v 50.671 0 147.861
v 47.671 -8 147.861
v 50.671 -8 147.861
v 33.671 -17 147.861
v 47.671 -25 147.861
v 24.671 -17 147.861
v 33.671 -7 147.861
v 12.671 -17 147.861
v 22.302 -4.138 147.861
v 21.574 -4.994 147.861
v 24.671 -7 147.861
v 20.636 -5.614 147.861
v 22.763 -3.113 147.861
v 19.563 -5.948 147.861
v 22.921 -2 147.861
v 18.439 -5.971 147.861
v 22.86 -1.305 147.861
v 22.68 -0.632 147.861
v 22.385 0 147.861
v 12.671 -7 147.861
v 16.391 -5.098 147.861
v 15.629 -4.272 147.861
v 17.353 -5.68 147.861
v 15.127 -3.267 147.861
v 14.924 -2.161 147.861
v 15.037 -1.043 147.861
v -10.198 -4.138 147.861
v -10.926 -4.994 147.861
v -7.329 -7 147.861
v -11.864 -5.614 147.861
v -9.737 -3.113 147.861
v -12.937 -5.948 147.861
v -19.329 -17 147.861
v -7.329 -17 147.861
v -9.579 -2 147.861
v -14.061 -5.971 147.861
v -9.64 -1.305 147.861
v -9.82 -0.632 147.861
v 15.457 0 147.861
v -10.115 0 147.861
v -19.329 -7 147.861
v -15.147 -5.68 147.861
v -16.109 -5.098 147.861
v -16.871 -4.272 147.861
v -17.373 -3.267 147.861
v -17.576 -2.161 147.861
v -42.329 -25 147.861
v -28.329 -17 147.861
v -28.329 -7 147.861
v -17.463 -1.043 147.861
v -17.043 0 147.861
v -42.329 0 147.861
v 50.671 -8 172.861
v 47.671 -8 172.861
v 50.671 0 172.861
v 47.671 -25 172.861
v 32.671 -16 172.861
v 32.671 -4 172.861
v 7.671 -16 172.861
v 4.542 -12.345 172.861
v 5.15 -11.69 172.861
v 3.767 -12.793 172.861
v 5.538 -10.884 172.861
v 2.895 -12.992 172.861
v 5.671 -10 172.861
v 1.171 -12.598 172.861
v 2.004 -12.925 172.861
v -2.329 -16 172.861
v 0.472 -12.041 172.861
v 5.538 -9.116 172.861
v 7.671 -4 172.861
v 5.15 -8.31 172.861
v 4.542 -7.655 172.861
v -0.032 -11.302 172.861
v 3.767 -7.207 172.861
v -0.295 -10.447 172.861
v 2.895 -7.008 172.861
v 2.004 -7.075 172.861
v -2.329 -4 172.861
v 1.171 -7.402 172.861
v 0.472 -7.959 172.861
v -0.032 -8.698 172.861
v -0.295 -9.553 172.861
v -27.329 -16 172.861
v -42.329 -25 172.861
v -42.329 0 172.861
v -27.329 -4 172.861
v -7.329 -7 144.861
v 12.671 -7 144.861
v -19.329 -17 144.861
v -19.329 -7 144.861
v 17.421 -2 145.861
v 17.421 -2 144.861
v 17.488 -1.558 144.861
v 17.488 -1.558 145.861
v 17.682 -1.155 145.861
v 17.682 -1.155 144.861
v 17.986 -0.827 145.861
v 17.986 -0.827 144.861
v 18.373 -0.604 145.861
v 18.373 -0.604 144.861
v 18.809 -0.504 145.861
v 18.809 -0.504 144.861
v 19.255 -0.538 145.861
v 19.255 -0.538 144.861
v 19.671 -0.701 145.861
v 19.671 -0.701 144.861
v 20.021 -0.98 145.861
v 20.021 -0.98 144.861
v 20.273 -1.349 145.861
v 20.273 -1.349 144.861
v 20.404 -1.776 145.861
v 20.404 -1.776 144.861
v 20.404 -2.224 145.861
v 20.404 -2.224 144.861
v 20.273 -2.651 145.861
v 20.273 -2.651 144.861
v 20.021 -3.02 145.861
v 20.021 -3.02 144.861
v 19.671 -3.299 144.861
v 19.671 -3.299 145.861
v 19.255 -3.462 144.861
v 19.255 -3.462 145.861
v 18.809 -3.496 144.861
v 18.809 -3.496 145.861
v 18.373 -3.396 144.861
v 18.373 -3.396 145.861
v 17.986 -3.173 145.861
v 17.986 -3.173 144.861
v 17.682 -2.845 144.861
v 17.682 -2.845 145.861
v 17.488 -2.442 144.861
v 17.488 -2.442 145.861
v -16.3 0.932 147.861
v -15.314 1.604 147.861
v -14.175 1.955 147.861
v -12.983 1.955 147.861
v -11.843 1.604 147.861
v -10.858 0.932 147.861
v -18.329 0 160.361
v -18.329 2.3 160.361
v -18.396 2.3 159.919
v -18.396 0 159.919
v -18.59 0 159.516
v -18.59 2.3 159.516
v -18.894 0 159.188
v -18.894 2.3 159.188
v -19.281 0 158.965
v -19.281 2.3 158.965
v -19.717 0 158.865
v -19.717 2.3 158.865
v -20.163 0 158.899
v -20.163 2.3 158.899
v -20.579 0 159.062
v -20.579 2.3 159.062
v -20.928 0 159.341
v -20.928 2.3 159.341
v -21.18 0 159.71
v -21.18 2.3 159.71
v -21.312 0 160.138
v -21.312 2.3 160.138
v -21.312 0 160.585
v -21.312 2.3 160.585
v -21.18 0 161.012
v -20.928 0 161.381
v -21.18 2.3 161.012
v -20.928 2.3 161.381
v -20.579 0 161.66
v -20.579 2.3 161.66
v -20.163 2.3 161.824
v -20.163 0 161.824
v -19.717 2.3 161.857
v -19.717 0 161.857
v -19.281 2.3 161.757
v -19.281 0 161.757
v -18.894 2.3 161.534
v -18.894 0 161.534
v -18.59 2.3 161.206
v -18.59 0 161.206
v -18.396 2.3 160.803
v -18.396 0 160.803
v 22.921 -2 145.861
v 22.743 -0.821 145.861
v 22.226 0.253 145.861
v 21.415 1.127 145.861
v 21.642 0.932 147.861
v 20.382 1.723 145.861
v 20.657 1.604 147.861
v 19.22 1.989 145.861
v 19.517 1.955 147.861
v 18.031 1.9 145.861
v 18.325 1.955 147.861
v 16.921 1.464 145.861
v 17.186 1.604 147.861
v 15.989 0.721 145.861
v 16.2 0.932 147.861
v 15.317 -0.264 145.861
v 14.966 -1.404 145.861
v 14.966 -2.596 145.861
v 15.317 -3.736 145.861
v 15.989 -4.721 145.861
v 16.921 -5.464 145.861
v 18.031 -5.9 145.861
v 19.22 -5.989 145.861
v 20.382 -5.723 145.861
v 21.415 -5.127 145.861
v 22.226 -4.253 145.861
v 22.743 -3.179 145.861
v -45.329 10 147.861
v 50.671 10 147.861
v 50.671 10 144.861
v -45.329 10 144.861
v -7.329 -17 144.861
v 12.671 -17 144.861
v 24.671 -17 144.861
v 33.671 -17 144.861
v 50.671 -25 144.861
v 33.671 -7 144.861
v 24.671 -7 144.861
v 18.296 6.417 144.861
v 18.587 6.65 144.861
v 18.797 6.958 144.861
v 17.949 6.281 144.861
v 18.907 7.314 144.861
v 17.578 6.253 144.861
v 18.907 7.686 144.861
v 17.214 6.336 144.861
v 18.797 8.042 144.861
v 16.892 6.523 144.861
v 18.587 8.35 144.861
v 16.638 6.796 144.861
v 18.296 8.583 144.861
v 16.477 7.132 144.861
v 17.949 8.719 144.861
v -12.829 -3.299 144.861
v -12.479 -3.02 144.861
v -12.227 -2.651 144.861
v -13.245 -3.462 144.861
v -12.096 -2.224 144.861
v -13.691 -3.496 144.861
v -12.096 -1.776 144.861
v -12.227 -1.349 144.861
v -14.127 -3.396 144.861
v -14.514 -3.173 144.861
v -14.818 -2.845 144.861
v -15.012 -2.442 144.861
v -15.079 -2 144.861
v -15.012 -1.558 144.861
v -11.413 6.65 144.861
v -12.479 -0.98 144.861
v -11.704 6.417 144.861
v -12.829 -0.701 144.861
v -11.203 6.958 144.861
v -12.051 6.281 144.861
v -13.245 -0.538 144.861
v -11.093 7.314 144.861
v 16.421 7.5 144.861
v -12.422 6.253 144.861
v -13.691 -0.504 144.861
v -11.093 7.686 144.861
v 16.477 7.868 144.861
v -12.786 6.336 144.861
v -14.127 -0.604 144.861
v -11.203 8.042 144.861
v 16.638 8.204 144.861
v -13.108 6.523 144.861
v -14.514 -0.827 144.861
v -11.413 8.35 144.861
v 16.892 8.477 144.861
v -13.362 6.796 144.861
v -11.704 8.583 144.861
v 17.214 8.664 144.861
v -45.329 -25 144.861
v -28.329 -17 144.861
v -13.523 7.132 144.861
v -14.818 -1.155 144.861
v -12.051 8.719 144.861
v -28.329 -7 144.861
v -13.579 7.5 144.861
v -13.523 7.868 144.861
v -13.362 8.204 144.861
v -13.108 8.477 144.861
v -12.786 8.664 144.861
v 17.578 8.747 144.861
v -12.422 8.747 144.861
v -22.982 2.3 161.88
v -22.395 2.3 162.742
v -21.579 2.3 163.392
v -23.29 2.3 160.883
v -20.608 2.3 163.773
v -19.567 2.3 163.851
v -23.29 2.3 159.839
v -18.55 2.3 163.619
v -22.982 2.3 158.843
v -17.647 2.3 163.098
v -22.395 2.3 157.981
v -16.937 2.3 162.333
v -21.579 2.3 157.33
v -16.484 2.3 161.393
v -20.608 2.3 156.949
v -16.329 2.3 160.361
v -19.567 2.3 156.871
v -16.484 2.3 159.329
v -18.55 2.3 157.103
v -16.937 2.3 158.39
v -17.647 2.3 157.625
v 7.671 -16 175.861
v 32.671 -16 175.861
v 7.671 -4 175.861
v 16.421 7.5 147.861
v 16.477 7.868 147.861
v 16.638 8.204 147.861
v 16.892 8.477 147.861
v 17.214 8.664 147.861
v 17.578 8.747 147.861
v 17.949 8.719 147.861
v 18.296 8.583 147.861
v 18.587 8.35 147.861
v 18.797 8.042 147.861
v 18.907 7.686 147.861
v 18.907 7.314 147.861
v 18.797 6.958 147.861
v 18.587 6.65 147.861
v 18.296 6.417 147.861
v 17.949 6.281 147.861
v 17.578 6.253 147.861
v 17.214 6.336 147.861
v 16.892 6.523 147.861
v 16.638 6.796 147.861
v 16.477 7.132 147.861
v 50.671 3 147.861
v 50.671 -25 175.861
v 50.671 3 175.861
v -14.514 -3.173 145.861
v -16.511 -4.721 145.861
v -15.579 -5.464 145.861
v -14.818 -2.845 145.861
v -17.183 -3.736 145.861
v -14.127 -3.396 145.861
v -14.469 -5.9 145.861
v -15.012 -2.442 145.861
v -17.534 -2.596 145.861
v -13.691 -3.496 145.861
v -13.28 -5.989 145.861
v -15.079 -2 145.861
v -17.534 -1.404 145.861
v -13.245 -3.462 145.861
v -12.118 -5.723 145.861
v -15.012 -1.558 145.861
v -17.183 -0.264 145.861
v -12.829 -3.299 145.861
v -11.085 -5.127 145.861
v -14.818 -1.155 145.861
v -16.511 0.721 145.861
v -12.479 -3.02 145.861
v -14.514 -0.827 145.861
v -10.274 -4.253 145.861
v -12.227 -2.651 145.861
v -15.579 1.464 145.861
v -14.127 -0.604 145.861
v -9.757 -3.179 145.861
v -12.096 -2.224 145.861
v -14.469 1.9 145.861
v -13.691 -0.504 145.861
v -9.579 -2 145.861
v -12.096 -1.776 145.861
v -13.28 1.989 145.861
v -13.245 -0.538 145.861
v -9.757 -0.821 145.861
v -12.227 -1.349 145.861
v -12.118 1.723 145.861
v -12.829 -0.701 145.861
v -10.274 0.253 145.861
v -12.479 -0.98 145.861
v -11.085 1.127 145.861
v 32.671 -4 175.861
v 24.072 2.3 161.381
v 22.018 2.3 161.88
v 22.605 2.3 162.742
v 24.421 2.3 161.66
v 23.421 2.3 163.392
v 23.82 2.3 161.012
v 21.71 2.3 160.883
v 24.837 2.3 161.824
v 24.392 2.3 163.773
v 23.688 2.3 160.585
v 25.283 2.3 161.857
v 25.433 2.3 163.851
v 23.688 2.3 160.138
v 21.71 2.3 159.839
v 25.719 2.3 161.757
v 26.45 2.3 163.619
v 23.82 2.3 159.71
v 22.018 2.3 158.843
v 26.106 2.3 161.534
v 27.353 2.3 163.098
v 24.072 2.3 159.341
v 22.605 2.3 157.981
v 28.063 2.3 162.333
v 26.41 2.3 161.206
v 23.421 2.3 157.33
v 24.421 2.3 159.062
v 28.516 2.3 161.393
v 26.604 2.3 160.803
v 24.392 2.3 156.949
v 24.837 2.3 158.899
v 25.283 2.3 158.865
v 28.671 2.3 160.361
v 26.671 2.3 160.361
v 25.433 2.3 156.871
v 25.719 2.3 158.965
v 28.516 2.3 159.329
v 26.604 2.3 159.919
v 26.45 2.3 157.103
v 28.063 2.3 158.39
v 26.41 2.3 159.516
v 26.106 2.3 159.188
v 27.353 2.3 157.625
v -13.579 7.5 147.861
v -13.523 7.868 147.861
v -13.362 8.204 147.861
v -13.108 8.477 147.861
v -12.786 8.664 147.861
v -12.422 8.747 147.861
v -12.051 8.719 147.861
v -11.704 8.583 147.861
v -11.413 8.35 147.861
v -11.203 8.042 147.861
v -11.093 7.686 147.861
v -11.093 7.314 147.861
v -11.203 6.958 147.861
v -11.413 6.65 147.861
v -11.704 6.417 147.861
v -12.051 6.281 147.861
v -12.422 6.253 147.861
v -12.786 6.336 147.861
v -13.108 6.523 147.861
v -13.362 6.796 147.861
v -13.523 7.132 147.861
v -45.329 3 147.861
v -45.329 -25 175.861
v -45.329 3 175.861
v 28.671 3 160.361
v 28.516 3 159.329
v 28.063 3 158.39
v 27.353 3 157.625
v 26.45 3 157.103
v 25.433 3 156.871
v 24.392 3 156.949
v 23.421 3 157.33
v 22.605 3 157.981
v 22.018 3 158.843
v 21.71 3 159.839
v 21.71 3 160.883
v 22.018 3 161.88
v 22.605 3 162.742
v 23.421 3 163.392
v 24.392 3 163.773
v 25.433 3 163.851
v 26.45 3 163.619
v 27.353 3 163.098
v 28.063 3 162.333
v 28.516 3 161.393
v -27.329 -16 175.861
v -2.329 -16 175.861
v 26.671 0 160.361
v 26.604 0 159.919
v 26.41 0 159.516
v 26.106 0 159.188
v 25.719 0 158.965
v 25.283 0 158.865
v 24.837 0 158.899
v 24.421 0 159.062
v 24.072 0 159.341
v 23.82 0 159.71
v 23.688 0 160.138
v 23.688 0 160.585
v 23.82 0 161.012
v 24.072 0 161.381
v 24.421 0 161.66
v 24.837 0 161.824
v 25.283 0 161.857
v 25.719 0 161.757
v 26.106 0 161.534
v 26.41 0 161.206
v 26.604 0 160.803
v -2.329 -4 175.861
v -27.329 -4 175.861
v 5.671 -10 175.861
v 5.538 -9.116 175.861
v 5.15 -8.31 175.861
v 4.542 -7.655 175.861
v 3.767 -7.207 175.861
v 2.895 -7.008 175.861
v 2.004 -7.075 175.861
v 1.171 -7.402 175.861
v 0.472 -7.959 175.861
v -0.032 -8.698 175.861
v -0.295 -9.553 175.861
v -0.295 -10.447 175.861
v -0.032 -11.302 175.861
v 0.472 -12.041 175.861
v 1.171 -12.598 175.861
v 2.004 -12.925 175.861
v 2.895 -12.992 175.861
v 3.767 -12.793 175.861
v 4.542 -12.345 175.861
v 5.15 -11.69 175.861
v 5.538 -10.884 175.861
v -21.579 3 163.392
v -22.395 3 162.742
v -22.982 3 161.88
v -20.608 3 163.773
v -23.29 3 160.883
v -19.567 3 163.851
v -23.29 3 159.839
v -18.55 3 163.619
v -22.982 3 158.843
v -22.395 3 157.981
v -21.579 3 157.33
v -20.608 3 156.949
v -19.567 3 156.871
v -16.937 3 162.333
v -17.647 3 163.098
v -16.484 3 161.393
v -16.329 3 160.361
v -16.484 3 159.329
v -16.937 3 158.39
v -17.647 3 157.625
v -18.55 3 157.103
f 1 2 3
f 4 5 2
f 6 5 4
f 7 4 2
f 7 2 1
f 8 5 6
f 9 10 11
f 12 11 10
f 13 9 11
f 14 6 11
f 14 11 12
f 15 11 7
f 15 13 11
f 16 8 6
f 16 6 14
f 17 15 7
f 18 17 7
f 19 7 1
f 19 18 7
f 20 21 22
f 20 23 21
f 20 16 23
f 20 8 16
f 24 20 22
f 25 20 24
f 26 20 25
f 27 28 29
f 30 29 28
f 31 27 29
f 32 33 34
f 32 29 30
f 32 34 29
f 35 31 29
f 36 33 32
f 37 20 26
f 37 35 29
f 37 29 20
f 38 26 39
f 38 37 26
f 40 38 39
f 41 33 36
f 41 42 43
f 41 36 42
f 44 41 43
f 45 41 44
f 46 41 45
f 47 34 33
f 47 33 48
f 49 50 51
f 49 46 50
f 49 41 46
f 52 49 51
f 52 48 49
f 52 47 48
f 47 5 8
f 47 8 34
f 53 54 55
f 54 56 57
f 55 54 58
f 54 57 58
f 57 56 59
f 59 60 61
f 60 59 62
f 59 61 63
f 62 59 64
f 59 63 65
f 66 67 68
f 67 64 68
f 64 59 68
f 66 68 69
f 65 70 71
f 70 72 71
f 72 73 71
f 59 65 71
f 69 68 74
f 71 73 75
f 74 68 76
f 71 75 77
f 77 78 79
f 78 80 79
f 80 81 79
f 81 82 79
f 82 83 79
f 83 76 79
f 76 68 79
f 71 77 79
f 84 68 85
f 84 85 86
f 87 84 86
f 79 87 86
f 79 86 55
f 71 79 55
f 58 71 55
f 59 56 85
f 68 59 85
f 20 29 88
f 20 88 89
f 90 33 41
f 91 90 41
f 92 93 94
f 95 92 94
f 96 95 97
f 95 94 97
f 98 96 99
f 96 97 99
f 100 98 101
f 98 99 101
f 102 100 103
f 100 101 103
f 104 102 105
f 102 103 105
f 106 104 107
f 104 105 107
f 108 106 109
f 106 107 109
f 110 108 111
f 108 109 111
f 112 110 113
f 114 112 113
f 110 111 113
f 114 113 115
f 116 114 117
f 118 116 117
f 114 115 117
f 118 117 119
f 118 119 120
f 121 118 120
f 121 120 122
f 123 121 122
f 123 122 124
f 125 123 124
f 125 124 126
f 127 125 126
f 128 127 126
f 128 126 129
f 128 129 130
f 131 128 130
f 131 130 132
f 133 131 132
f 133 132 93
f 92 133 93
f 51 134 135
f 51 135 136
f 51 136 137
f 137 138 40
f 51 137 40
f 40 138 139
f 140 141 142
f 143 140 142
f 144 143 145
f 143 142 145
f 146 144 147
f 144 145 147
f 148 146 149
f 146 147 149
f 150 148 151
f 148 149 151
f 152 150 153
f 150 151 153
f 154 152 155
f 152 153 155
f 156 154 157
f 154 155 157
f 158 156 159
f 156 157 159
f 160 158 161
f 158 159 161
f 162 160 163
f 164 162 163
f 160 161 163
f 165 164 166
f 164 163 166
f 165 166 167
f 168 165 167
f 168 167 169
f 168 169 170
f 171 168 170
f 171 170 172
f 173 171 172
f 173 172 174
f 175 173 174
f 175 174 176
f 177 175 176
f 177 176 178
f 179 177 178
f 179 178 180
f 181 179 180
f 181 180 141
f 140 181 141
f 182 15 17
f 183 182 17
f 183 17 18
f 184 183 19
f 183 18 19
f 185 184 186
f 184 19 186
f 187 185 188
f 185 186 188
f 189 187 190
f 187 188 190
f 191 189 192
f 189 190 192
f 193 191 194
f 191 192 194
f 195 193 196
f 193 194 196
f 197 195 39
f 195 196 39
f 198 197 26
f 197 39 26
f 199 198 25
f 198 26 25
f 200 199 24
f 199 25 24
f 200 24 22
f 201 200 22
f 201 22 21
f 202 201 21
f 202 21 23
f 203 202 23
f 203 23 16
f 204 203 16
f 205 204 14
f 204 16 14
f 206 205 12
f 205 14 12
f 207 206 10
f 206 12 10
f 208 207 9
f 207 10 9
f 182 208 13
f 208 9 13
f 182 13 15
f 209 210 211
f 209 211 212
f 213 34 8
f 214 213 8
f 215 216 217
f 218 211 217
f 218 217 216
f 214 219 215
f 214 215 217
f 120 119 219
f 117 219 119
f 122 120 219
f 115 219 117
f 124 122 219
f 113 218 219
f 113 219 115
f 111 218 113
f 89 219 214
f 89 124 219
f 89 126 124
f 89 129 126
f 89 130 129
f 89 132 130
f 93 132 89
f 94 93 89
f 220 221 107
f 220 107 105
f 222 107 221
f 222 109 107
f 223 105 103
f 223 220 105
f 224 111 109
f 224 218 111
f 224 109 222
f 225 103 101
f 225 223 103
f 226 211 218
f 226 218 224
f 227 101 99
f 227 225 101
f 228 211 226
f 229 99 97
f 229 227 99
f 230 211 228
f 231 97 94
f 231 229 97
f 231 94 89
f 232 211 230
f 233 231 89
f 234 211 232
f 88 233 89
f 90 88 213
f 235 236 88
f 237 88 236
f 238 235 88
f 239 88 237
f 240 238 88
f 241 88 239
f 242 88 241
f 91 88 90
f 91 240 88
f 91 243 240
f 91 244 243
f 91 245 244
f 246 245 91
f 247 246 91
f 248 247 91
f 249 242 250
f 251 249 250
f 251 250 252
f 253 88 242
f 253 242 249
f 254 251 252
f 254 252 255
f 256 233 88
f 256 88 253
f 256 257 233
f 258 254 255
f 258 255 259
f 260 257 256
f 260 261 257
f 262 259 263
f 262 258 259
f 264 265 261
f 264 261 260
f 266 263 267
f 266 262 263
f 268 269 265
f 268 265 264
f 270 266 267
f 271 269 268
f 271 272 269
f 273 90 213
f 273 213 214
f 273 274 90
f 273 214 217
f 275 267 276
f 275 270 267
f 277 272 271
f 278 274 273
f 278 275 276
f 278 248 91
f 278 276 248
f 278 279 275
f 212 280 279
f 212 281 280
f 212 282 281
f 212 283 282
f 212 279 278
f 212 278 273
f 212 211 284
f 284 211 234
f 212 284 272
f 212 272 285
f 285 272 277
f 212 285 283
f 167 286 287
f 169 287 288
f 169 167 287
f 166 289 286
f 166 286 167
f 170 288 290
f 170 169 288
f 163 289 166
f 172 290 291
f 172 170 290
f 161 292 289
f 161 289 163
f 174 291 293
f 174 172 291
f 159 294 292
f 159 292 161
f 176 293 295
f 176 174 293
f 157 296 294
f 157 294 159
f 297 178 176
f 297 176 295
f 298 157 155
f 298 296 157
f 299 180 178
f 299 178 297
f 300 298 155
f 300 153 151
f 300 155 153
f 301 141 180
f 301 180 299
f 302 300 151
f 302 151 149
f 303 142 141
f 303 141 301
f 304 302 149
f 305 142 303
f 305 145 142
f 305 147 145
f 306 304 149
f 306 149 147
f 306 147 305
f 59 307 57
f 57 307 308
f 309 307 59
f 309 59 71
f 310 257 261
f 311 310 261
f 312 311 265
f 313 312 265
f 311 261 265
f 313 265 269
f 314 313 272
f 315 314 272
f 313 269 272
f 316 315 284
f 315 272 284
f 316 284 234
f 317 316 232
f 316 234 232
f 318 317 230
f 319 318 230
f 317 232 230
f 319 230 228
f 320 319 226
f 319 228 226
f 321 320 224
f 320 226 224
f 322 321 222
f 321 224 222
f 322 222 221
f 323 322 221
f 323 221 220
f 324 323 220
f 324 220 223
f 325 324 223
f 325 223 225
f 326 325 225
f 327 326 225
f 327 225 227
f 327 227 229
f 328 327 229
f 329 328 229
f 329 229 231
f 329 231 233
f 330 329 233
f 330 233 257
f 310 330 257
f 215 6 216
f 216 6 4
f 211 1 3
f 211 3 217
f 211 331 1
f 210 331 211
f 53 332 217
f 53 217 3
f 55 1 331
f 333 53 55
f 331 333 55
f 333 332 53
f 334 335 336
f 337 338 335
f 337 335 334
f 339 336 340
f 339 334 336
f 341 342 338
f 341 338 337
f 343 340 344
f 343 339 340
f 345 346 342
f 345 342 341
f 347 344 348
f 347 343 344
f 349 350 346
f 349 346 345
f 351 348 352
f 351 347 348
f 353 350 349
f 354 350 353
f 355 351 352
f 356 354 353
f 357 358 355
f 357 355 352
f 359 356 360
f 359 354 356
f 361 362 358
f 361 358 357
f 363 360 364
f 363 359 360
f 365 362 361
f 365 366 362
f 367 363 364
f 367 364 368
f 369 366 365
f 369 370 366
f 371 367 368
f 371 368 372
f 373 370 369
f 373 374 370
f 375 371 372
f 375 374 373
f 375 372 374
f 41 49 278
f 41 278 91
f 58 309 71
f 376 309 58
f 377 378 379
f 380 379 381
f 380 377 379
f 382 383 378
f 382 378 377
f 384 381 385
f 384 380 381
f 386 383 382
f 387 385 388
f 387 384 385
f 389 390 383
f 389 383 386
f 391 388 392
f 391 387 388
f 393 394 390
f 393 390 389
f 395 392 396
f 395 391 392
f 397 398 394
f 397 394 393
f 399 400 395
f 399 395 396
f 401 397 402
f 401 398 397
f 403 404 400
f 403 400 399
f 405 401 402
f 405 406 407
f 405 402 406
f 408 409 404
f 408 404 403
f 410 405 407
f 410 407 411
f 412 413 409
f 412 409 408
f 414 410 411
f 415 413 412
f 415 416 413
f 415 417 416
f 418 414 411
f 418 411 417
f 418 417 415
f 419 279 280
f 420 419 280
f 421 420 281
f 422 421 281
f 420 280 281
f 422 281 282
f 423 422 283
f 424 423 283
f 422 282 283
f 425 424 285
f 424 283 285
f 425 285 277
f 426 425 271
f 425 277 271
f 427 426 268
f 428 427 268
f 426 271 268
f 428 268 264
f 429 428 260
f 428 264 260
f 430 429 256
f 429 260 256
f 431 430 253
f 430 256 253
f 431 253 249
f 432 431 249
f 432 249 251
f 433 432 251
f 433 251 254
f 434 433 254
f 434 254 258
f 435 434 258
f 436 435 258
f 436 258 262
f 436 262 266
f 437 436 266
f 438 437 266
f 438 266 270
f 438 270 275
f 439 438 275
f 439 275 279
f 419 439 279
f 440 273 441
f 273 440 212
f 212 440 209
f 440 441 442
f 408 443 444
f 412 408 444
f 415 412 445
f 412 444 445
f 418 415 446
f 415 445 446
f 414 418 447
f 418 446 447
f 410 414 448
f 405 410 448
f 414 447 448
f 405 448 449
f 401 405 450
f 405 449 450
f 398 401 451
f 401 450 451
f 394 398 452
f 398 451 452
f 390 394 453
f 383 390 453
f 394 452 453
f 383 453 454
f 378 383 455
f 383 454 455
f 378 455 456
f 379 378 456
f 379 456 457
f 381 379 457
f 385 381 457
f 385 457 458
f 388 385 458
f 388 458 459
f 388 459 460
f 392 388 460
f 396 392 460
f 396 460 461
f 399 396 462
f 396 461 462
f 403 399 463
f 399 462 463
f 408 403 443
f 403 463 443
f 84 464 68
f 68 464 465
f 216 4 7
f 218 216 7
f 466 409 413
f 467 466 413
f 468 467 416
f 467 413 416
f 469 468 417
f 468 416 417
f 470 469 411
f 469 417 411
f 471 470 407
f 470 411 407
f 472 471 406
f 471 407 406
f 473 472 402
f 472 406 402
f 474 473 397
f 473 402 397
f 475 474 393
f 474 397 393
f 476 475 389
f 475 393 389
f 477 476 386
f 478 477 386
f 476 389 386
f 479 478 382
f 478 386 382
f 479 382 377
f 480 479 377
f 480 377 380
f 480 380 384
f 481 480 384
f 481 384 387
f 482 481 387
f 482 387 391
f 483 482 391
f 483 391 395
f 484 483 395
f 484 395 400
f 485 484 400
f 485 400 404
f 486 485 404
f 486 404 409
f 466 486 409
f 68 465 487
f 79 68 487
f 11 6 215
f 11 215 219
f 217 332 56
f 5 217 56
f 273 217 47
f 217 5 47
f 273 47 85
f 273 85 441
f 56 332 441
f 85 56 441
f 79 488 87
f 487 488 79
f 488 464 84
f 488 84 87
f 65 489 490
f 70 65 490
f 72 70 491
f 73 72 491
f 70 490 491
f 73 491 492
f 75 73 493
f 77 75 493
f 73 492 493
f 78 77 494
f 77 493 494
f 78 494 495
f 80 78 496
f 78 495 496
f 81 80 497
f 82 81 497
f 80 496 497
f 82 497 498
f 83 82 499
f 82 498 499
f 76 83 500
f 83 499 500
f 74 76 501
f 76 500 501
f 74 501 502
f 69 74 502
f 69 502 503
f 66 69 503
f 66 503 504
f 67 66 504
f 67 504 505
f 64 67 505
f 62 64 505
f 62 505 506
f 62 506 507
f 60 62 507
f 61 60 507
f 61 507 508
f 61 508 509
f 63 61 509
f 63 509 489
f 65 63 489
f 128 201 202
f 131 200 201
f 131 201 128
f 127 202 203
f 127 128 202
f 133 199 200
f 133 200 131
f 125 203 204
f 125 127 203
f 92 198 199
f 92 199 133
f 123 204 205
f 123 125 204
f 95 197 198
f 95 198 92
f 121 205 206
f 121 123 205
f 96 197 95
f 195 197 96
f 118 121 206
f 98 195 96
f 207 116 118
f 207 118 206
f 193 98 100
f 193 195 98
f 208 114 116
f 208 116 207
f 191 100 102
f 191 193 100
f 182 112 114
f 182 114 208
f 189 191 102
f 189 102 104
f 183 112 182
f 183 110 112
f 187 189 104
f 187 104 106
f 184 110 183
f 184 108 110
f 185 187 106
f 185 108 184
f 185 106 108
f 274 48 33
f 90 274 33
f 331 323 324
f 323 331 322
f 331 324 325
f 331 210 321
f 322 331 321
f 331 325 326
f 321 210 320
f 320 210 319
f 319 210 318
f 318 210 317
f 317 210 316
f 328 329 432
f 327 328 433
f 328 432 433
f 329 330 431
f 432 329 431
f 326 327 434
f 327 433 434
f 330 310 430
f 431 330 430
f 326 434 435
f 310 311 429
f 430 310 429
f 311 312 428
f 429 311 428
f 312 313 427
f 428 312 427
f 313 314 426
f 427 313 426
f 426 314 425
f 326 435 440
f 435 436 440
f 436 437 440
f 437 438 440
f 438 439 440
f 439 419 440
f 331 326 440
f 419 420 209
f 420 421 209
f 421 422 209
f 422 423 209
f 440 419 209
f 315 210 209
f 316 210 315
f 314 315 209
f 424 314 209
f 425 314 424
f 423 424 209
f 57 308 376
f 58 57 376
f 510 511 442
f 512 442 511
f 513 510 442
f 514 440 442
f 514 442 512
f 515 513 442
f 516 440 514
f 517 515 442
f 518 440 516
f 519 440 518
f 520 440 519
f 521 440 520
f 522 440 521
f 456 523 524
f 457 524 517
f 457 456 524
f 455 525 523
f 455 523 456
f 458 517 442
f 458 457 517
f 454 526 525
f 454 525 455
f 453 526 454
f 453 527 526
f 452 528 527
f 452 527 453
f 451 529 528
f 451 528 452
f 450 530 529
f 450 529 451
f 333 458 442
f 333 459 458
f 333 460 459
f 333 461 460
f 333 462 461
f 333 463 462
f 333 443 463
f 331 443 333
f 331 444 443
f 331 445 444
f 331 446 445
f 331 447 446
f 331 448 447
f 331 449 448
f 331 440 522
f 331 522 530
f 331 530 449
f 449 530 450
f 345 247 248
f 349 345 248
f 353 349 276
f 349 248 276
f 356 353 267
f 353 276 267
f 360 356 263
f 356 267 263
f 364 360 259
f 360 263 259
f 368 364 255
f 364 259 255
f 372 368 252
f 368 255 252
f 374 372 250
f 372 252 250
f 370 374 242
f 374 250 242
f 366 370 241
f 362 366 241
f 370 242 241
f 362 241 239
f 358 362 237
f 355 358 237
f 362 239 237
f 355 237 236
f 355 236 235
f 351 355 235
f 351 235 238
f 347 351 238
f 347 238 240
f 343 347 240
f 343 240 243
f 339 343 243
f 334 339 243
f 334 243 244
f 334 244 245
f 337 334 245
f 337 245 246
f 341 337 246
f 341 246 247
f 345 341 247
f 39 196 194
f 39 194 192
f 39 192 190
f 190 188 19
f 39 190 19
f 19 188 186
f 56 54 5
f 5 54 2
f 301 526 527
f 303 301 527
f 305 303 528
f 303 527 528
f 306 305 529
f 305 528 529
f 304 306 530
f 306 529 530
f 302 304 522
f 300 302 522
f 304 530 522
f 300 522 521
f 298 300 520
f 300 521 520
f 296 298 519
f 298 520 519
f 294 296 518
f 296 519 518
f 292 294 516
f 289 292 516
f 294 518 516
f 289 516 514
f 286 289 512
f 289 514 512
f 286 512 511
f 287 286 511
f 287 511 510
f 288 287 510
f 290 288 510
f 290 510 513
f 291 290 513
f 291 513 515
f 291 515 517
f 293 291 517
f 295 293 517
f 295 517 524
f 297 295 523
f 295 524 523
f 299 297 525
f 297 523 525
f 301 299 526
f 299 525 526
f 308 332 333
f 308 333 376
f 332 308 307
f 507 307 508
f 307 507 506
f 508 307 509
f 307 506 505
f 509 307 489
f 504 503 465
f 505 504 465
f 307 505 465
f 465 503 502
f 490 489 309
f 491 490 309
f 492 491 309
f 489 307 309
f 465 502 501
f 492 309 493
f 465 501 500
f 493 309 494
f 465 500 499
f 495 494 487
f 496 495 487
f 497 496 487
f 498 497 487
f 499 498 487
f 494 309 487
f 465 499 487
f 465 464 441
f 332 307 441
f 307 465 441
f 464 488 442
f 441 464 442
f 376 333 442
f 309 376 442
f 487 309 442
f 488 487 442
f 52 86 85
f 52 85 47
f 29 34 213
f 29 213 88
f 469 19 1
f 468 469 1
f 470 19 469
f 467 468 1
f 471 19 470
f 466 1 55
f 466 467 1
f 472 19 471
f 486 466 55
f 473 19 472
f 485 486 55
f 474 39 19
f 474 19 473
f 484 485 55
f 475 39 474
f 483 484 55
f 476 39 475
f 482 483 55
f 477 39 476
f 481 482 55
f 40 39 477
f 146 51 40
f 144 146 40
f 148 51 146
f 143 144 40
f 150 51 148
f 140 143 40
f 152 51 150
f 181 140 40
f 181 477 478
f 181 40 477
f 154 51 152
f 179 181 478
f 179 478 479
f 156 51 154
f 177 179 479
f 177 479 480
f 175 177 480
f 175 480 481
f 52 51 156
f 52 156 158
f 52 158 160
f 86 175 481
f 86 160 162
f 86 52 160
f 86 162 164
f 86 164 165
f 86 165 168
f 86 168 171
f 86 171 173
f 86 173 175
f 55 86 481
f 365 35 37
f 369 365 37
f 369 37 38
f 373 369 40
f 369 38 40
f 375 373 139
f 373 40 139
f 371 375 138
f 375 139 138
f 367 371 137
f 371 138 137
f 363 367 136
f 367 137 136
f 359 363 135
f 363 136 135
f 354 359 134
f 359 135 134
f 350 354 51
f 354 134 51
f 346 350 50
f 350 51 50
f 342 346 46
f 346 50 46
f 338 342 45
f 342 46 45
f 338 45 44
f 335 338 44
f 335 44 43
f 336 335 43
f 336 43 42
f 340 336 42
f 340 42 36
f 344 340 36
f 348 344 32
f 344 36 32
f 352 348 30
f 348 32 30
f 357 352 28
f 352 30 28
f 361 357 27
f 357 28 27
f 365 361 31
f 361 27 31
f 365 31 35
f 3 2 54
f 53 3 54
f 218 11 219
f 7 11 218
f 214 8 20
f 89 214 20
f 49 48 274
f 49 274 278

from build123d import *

# Parameters (mm, degrees)
SKETCH1_W           = 96
SKETCH1_H           = 28
BOSS_EXTRUDE1_DEPTH = 3
SKETCH2_W           = 3
SKETCH2_H           = 25
BOSS_EXTRUDE2_DEPTH = 25
SKETCH3_W           = 96
SKETCH3_H           = 35
BOSS_EXTRUDE3_DEPTH = 3
CUT_EXTRUDE2_REACH  = 30
SKETCH4_R           = 1.5
SKETCH5_R           = 3.5
CUT_EXTRUDE3_DEPTH  = 0.7
CUT_EXTRUDE4_REACH  = 33
SKETCH6_R           = 1.5
SKETCH6_R_2         = 1.25
SKETCH7_R           = 4
CUT_EXTRUDE5_DEPTH  = 2
CUT_EXTRUDE7_REACH  = 33
SKETCH8_R           = 3
SKETCH8_W           = 25
SKETCH8_H           = 12
CUT_EXTRUDE8_REACH  = 5
SKETCH9_W           = 20
SKETCH9_H           = 10
SKETCH9_W_2         = 9
CUT_EXTRUDE9_REACH  = 5
SKETCH10_W          = 25
SKETCH10_H          = 8


with BuildPart() as part:
    # Sketch1 → Boss-Extrude1 (new body)
    with BuildSketch(Plane(origin=(0, 0, 0), x_dir=(1, 0, 0), z_dir=(0, 1, 0))):
        with Locations((2.671135036, -161.861135542)):
            Rectangle(SKETCH1_W, SKETCH1_H)
    extrude(amount=BOSS_EXTRUDE1_DEPTH)

    # Sketch2 → Boss-Extrude2 (add)
    with BuildSketch(Plane(origin=(0, 0, 0), x_dir=(-1, 0, 0), z_dir=(0, -1, 0))):
        Polygon((-50.671135036, -175.861135542), (45.328864964, -175.861135542), (45.328864964, -172.861135542), (42.328864964, -172.861135542), (-47.671135036, -172.861135542), (-50.671135036, -172.861135542), align=None)
        with Locations((43.828864964, -160.361135542)):
            Rectangle(SKETCH2_W, SKETCH2_H)
        with Locations((-49.171135036, -160.361135542)):
            Rectangle(SKETCH2_W, SKETCH2_H)
    extrude(amount=BOSS_EXTRUDE2_DEPTH)

    # Sketch3 → Boss-Extrude3 (add)
    with BuildSketch(Plane(origin=(0, 0, 147.861135542), x_dir=(-1, 0, 0), z_dir=(0, 0, -1))):
        with Locations((-2.671135036, -7.5)):
            Rectangle(SKETCH3_W, SKETCH3_H)
    extrude(amount=BOSS_EXTRUDE3_DEPTH)

    # Sketch4 → Cut-Extrude2 (cut, up to next)
    with BuildSketch(Plane(origin=(0, 3, 0), x_dir=(1, 0, 0), z_dir=(0, 1, 0)), mode=Mode.PRIVATE) as cut_extrude2_sk1:
        with Locations((-19.828864964, -160.361135542)):
            Circle(SKETCH4_R)
    cut_extrude2_tool1 = extrude(cut_extrude2_sk1.sketch, amount=-CUT_EXTRUDE2_REACH, mode=Mode.PRIVATE) & part.part
    add(cut_extrude2_tool1.solids().sort_by_distance((-19.828865, 3, 160.361136))[0], mode=Mode.SUBTRACT)
    # Sketch4 → Cut-Extrude2 (cut, up to next)
    with BuildSketch(Plane(origin=(0, 3, 0), x_dir=(1, 0, 0), z_dir=(0, 1, 0)), mode=Mode.PRIVATE) as cut_extrude2_sk2:
        with Locations((25.171135036, -160.361135542)):
            Circle(SKETCH4_R)
    cut_extrude2_tool2 = extrude(cut_extrude2_sk2.sketch, amount=-CUT_EXTRUDE2_REACH, mode=Mode.PRIVATE) & part.part
    add(cut_extrude2_tool2.solids().sort_by_distance((25.171135, 3, 160.361136))[0], mode=Mode.SUBTRACT)

    # Sketch5 → Cut-Extrude3 (cut)
    with BuildSketch(Plane(origin=(0, 3, 0), x_dir=(1, 0, 0), z_dir=(0, 1, 0))):
        with Locations((-19.828864964, -160.361135542)):
            Circle(SKETCH5_R)
        with Locations((25.171135036, -160.361135542)):
            Circle(SKETCH5_R)
    extrude(amount=-CUT_EXTRUDE3_DEPTH, mode=Mode.SUBTRACT)

    # Sketch6 → Cut-Extrude4 (cut, up to next)
    with BuildSketch(Plane(origin=(0, 0, 144.861135542), x_dir=(-1, 0, 0), z_dir=(0, 0, -1)), mode=Mode.PRIVATE) as cut_extrude4_sk1:
        with Locations((-18.921135036, -2)):
            Circle(SKETCH6_R)
    cut_extrude4_tool1 = extrude(cut_extrude4_sk1.sketch, amount=-CUT_EXTRUDE4_REACH, mode=Mode.PRIVATE) & part.part
    add(cut_extrude4_tool1.solids().sort_by_distance((18.921135, -2, 144.861136))[0], mode=Mode.SUBTRACT)
    # Sketch6 → Cut-Extrude4 (cut, up to next)
    with BuildSketch(Plane(origin=(0, 0, 144.861135542), x_dir=(-1, 0, 0), z_dir=(0, 0, -1)), mode=Mode.PRIVATE) as cut_extrude4_sk2:
        with Locations((13.578864964, -2)):
            Circle(SKETCH6_R)
    cut_extrude4_tool2 = extrude(cut_extrude4_sk2.sketch, amount=-CUT_EXTRUDE4_REACH, mode=Mode.PRIVATE) & part.part
    add(cut_extrude4_tool2.solids().sort_by_distance((-13.578865, -2, 144.861136))[0], mode=Mode.SUBTRACT)
    # Sketch6 → Cut-Extrude4 (cut, up to next)
    with BuildSketch(Plane(origin=(0, 0, 144.861135542), x_dir=(-1, 0, 0), z_dir=(0, 0, -1)), mode=Mode.PRIVATE) as cut_extrude4_sk3:
        with Locations((12.328864964, 7.5)):
            Circle(SKETCH6_R_2)
    cut_extrude4_tool3 = extrude(cut_extrude4_sk3.sketch, amount=-CUT_EXTRUDE4_REACH, mode=Mode.PRIVATE) & part.part
    add(cut_extrude4_tool3.solids().sort_by_distance((-12.328865, 7.5, 144.861136))[0], mode=Mode.SUBTRACT)
    # Sketch6 → Cut-Extrude4 (cut, up to next)
    with BuildSketch(Plane(origin=(0, 0, 144.861135542), x_dir=(-1, 0, 0), z_dir=(0, 0, -1)), mode=Mode.PRIVATE) as cut_extrude4_sk4:
        with Locations((-17.671135036, 7.5)):
            Circle(SKETCH6_R_2)
    cut_extrude4_tool4 = extrude(cut_extrude4_sk4.sketch, amount=-CUT_EXTRUDE4_REACH, mode=Mode.PRIVATE) & part.part
    add(cut_extrude4_tool4.solids().sort_by_distance((17.671135, 7.5, 144.861136))[0], mode=Mode.SUBTRACT)

    # Sketch7 → Cut-Extrude5 (cut)
    with BuildSketch(Plane.XY.offset(147.861135542)):
        with Locations((18.921135036, -2)):
            Circle(SKETCH7_R)
        with Locations((-13.578864964, -2)):
            Circle(SKETCH7_R)
    extrude(amount=-CUT_EXTRUDE5_DEPTH, mode=Mode.SUBTRACT)

    # Sketch8 → Cut-Extrude7 (cut, up to next)
    with BuildSketch(Plane.XY.offset(175.861135542), mode=Mode.PRIVATE) as cut_extrude7_sk1:
        with Locations((2.671135036, -10)):
            Circle(SKETCH8_R)
    cut_extrude7_tool1 = extrude(cut_extrude7_sk1.sketch, amount=-CUT_EXTRUDE7_REACH, mode=Mode.PRIVATE) & part.part
    add(cut_extrude7_tool1.solids().sort_by_distance((2.671135, -10, 175.861136))[0], mode=Mode.SUBTRACT)
    # Sketch8 → Cut-Extrude7 (cut, up to next)
    with BuildSketch(Plane.XY.offset(175.861135542), mode=Mode.PRIVATE) as cut_extrude7_sk2:
        with Locations((-14.828864964, -10)):
            Rectangle(SKETCH8_W, SKETCH8_H)
    cut_extrude7_tool2 = extrude(cut_extrude7_sk2.sketch, amount=-CUT_EXTRUDE7_REACH, mode=Mode.PRIVATE) & part.part
    add(cut_extrude7_tool2.solids().sort_by_distance((-14.828865, -10, 175.861136))[0], mode=Mode.SUBTRACT)
    # Sketch8 → Cut-Extrude7 (cut, up to next)
    with BuildSketch(Plane.XY.offset(175.861135542), mode=Mode.PRIVATE) as cut_extrude7_sk3:
        with Locations((20.171135036, -10)):
            Rectangle(SKETCH8_W, SKETCH8_H)
    cut_extrude7_tool3 = extrude(cut_extrude7_sk3.sketch, amount=-CUT_EXTRUDE7_REACH, mode=Mode.PRIVATE) & part.part
    add(cut_extrude7_tool3.solids().sort_by_distance((20.171135, -10, 175.861136))[0], mode=Mode.SUBTRACT)

    # Sketch9 → Cut-Extrude8 (cut, up to next)
    with BuildSketch(Plane.XY.offset(147.861135542), mode=Mode.PRIVATE) as cut_extrude8_sk1:
        with Locations((2.671135036, -12)):
            Rectangle(SKETCH9_W, SKETCH9_H)
    cut_extrude8_tool1 = extrude(cut_extrude8_sk1.sketch, amount=-CUT_EXTRUDE8_REACH, mode=Mode.PRIVATE) & part.part
    add(cut_extrude8_tool1.solids().sort_by_distance((2.671135, -12, 147.861136))[0], mode=Mode.SUBTRACT)
    # Sketch9 → Cut-Extrude8 (cut, up to next)
    with BuildSketch(Plane.XY.offset(147.861135542), mode=Mode.PRIVATE) as cut_extrude8_sk2:
        with Locations((-23.828864964, -12)):
            Rectangle(SKETCH9_W_2, SKETCH9_H)
    cut_extrude8_tool2 = extrude(cut_extrude8_sk2.sketch, amount=-CUT_EXTRUDE8_REACH, mode=Mode.PRIVATE) & part.part
    add(cut_extrude8_tool2.solids().sort_by_distance((-23.828865, -12, 147.861136))[0], mode=Mode.SUBTRACT)
    # Sketch9 → Cut-Extrude8 (cut, up to next)
    with BuildSketch(Plane.XY.offset(147.861135542), mode=Mode.PRIVATE) as cut_extrude8_sk3:
        with Locations((29.171135036, -12)):
            Rectangle(SKETCH9_W_2, SKETCH9_H)
    cut_extrude8_tool3 = extrude(cut_extrude8_sk3.sketch, amount=-CUT_EXTRUDE8_REACH, mode=Mode.PRIVATE) & part.part
    add(cut_extrude8_tool3.solids().sort_by_distance((29.171135, -12, 147.861136))[0], mode=Mode.SUBTRACT)

    # Sketch10 → Cut-Extrude9 (cut, up to next)
    with BuildSketch(Plane.ZY.offset(-47.671135036), mode=Mode.PRIVATE) as cut_extrude9_sk1:
        with Locations((160.361135542, -4)):
            Rectangle(SKETCH10_W, SKETCH10_H)
    cut_extrude9_tool1 = extrude(cut_extrude9_sk1.sketch, amount=-CUT_EXTRUDE9_REACH, mode=Mode.PRIVATE) & part.part
    add(cut_extrude9_tool1.solids().sort_by_distance((47.671135, -4, 160.361136))[0], mode=Mode.SUBTRACT)


solid = part.part
